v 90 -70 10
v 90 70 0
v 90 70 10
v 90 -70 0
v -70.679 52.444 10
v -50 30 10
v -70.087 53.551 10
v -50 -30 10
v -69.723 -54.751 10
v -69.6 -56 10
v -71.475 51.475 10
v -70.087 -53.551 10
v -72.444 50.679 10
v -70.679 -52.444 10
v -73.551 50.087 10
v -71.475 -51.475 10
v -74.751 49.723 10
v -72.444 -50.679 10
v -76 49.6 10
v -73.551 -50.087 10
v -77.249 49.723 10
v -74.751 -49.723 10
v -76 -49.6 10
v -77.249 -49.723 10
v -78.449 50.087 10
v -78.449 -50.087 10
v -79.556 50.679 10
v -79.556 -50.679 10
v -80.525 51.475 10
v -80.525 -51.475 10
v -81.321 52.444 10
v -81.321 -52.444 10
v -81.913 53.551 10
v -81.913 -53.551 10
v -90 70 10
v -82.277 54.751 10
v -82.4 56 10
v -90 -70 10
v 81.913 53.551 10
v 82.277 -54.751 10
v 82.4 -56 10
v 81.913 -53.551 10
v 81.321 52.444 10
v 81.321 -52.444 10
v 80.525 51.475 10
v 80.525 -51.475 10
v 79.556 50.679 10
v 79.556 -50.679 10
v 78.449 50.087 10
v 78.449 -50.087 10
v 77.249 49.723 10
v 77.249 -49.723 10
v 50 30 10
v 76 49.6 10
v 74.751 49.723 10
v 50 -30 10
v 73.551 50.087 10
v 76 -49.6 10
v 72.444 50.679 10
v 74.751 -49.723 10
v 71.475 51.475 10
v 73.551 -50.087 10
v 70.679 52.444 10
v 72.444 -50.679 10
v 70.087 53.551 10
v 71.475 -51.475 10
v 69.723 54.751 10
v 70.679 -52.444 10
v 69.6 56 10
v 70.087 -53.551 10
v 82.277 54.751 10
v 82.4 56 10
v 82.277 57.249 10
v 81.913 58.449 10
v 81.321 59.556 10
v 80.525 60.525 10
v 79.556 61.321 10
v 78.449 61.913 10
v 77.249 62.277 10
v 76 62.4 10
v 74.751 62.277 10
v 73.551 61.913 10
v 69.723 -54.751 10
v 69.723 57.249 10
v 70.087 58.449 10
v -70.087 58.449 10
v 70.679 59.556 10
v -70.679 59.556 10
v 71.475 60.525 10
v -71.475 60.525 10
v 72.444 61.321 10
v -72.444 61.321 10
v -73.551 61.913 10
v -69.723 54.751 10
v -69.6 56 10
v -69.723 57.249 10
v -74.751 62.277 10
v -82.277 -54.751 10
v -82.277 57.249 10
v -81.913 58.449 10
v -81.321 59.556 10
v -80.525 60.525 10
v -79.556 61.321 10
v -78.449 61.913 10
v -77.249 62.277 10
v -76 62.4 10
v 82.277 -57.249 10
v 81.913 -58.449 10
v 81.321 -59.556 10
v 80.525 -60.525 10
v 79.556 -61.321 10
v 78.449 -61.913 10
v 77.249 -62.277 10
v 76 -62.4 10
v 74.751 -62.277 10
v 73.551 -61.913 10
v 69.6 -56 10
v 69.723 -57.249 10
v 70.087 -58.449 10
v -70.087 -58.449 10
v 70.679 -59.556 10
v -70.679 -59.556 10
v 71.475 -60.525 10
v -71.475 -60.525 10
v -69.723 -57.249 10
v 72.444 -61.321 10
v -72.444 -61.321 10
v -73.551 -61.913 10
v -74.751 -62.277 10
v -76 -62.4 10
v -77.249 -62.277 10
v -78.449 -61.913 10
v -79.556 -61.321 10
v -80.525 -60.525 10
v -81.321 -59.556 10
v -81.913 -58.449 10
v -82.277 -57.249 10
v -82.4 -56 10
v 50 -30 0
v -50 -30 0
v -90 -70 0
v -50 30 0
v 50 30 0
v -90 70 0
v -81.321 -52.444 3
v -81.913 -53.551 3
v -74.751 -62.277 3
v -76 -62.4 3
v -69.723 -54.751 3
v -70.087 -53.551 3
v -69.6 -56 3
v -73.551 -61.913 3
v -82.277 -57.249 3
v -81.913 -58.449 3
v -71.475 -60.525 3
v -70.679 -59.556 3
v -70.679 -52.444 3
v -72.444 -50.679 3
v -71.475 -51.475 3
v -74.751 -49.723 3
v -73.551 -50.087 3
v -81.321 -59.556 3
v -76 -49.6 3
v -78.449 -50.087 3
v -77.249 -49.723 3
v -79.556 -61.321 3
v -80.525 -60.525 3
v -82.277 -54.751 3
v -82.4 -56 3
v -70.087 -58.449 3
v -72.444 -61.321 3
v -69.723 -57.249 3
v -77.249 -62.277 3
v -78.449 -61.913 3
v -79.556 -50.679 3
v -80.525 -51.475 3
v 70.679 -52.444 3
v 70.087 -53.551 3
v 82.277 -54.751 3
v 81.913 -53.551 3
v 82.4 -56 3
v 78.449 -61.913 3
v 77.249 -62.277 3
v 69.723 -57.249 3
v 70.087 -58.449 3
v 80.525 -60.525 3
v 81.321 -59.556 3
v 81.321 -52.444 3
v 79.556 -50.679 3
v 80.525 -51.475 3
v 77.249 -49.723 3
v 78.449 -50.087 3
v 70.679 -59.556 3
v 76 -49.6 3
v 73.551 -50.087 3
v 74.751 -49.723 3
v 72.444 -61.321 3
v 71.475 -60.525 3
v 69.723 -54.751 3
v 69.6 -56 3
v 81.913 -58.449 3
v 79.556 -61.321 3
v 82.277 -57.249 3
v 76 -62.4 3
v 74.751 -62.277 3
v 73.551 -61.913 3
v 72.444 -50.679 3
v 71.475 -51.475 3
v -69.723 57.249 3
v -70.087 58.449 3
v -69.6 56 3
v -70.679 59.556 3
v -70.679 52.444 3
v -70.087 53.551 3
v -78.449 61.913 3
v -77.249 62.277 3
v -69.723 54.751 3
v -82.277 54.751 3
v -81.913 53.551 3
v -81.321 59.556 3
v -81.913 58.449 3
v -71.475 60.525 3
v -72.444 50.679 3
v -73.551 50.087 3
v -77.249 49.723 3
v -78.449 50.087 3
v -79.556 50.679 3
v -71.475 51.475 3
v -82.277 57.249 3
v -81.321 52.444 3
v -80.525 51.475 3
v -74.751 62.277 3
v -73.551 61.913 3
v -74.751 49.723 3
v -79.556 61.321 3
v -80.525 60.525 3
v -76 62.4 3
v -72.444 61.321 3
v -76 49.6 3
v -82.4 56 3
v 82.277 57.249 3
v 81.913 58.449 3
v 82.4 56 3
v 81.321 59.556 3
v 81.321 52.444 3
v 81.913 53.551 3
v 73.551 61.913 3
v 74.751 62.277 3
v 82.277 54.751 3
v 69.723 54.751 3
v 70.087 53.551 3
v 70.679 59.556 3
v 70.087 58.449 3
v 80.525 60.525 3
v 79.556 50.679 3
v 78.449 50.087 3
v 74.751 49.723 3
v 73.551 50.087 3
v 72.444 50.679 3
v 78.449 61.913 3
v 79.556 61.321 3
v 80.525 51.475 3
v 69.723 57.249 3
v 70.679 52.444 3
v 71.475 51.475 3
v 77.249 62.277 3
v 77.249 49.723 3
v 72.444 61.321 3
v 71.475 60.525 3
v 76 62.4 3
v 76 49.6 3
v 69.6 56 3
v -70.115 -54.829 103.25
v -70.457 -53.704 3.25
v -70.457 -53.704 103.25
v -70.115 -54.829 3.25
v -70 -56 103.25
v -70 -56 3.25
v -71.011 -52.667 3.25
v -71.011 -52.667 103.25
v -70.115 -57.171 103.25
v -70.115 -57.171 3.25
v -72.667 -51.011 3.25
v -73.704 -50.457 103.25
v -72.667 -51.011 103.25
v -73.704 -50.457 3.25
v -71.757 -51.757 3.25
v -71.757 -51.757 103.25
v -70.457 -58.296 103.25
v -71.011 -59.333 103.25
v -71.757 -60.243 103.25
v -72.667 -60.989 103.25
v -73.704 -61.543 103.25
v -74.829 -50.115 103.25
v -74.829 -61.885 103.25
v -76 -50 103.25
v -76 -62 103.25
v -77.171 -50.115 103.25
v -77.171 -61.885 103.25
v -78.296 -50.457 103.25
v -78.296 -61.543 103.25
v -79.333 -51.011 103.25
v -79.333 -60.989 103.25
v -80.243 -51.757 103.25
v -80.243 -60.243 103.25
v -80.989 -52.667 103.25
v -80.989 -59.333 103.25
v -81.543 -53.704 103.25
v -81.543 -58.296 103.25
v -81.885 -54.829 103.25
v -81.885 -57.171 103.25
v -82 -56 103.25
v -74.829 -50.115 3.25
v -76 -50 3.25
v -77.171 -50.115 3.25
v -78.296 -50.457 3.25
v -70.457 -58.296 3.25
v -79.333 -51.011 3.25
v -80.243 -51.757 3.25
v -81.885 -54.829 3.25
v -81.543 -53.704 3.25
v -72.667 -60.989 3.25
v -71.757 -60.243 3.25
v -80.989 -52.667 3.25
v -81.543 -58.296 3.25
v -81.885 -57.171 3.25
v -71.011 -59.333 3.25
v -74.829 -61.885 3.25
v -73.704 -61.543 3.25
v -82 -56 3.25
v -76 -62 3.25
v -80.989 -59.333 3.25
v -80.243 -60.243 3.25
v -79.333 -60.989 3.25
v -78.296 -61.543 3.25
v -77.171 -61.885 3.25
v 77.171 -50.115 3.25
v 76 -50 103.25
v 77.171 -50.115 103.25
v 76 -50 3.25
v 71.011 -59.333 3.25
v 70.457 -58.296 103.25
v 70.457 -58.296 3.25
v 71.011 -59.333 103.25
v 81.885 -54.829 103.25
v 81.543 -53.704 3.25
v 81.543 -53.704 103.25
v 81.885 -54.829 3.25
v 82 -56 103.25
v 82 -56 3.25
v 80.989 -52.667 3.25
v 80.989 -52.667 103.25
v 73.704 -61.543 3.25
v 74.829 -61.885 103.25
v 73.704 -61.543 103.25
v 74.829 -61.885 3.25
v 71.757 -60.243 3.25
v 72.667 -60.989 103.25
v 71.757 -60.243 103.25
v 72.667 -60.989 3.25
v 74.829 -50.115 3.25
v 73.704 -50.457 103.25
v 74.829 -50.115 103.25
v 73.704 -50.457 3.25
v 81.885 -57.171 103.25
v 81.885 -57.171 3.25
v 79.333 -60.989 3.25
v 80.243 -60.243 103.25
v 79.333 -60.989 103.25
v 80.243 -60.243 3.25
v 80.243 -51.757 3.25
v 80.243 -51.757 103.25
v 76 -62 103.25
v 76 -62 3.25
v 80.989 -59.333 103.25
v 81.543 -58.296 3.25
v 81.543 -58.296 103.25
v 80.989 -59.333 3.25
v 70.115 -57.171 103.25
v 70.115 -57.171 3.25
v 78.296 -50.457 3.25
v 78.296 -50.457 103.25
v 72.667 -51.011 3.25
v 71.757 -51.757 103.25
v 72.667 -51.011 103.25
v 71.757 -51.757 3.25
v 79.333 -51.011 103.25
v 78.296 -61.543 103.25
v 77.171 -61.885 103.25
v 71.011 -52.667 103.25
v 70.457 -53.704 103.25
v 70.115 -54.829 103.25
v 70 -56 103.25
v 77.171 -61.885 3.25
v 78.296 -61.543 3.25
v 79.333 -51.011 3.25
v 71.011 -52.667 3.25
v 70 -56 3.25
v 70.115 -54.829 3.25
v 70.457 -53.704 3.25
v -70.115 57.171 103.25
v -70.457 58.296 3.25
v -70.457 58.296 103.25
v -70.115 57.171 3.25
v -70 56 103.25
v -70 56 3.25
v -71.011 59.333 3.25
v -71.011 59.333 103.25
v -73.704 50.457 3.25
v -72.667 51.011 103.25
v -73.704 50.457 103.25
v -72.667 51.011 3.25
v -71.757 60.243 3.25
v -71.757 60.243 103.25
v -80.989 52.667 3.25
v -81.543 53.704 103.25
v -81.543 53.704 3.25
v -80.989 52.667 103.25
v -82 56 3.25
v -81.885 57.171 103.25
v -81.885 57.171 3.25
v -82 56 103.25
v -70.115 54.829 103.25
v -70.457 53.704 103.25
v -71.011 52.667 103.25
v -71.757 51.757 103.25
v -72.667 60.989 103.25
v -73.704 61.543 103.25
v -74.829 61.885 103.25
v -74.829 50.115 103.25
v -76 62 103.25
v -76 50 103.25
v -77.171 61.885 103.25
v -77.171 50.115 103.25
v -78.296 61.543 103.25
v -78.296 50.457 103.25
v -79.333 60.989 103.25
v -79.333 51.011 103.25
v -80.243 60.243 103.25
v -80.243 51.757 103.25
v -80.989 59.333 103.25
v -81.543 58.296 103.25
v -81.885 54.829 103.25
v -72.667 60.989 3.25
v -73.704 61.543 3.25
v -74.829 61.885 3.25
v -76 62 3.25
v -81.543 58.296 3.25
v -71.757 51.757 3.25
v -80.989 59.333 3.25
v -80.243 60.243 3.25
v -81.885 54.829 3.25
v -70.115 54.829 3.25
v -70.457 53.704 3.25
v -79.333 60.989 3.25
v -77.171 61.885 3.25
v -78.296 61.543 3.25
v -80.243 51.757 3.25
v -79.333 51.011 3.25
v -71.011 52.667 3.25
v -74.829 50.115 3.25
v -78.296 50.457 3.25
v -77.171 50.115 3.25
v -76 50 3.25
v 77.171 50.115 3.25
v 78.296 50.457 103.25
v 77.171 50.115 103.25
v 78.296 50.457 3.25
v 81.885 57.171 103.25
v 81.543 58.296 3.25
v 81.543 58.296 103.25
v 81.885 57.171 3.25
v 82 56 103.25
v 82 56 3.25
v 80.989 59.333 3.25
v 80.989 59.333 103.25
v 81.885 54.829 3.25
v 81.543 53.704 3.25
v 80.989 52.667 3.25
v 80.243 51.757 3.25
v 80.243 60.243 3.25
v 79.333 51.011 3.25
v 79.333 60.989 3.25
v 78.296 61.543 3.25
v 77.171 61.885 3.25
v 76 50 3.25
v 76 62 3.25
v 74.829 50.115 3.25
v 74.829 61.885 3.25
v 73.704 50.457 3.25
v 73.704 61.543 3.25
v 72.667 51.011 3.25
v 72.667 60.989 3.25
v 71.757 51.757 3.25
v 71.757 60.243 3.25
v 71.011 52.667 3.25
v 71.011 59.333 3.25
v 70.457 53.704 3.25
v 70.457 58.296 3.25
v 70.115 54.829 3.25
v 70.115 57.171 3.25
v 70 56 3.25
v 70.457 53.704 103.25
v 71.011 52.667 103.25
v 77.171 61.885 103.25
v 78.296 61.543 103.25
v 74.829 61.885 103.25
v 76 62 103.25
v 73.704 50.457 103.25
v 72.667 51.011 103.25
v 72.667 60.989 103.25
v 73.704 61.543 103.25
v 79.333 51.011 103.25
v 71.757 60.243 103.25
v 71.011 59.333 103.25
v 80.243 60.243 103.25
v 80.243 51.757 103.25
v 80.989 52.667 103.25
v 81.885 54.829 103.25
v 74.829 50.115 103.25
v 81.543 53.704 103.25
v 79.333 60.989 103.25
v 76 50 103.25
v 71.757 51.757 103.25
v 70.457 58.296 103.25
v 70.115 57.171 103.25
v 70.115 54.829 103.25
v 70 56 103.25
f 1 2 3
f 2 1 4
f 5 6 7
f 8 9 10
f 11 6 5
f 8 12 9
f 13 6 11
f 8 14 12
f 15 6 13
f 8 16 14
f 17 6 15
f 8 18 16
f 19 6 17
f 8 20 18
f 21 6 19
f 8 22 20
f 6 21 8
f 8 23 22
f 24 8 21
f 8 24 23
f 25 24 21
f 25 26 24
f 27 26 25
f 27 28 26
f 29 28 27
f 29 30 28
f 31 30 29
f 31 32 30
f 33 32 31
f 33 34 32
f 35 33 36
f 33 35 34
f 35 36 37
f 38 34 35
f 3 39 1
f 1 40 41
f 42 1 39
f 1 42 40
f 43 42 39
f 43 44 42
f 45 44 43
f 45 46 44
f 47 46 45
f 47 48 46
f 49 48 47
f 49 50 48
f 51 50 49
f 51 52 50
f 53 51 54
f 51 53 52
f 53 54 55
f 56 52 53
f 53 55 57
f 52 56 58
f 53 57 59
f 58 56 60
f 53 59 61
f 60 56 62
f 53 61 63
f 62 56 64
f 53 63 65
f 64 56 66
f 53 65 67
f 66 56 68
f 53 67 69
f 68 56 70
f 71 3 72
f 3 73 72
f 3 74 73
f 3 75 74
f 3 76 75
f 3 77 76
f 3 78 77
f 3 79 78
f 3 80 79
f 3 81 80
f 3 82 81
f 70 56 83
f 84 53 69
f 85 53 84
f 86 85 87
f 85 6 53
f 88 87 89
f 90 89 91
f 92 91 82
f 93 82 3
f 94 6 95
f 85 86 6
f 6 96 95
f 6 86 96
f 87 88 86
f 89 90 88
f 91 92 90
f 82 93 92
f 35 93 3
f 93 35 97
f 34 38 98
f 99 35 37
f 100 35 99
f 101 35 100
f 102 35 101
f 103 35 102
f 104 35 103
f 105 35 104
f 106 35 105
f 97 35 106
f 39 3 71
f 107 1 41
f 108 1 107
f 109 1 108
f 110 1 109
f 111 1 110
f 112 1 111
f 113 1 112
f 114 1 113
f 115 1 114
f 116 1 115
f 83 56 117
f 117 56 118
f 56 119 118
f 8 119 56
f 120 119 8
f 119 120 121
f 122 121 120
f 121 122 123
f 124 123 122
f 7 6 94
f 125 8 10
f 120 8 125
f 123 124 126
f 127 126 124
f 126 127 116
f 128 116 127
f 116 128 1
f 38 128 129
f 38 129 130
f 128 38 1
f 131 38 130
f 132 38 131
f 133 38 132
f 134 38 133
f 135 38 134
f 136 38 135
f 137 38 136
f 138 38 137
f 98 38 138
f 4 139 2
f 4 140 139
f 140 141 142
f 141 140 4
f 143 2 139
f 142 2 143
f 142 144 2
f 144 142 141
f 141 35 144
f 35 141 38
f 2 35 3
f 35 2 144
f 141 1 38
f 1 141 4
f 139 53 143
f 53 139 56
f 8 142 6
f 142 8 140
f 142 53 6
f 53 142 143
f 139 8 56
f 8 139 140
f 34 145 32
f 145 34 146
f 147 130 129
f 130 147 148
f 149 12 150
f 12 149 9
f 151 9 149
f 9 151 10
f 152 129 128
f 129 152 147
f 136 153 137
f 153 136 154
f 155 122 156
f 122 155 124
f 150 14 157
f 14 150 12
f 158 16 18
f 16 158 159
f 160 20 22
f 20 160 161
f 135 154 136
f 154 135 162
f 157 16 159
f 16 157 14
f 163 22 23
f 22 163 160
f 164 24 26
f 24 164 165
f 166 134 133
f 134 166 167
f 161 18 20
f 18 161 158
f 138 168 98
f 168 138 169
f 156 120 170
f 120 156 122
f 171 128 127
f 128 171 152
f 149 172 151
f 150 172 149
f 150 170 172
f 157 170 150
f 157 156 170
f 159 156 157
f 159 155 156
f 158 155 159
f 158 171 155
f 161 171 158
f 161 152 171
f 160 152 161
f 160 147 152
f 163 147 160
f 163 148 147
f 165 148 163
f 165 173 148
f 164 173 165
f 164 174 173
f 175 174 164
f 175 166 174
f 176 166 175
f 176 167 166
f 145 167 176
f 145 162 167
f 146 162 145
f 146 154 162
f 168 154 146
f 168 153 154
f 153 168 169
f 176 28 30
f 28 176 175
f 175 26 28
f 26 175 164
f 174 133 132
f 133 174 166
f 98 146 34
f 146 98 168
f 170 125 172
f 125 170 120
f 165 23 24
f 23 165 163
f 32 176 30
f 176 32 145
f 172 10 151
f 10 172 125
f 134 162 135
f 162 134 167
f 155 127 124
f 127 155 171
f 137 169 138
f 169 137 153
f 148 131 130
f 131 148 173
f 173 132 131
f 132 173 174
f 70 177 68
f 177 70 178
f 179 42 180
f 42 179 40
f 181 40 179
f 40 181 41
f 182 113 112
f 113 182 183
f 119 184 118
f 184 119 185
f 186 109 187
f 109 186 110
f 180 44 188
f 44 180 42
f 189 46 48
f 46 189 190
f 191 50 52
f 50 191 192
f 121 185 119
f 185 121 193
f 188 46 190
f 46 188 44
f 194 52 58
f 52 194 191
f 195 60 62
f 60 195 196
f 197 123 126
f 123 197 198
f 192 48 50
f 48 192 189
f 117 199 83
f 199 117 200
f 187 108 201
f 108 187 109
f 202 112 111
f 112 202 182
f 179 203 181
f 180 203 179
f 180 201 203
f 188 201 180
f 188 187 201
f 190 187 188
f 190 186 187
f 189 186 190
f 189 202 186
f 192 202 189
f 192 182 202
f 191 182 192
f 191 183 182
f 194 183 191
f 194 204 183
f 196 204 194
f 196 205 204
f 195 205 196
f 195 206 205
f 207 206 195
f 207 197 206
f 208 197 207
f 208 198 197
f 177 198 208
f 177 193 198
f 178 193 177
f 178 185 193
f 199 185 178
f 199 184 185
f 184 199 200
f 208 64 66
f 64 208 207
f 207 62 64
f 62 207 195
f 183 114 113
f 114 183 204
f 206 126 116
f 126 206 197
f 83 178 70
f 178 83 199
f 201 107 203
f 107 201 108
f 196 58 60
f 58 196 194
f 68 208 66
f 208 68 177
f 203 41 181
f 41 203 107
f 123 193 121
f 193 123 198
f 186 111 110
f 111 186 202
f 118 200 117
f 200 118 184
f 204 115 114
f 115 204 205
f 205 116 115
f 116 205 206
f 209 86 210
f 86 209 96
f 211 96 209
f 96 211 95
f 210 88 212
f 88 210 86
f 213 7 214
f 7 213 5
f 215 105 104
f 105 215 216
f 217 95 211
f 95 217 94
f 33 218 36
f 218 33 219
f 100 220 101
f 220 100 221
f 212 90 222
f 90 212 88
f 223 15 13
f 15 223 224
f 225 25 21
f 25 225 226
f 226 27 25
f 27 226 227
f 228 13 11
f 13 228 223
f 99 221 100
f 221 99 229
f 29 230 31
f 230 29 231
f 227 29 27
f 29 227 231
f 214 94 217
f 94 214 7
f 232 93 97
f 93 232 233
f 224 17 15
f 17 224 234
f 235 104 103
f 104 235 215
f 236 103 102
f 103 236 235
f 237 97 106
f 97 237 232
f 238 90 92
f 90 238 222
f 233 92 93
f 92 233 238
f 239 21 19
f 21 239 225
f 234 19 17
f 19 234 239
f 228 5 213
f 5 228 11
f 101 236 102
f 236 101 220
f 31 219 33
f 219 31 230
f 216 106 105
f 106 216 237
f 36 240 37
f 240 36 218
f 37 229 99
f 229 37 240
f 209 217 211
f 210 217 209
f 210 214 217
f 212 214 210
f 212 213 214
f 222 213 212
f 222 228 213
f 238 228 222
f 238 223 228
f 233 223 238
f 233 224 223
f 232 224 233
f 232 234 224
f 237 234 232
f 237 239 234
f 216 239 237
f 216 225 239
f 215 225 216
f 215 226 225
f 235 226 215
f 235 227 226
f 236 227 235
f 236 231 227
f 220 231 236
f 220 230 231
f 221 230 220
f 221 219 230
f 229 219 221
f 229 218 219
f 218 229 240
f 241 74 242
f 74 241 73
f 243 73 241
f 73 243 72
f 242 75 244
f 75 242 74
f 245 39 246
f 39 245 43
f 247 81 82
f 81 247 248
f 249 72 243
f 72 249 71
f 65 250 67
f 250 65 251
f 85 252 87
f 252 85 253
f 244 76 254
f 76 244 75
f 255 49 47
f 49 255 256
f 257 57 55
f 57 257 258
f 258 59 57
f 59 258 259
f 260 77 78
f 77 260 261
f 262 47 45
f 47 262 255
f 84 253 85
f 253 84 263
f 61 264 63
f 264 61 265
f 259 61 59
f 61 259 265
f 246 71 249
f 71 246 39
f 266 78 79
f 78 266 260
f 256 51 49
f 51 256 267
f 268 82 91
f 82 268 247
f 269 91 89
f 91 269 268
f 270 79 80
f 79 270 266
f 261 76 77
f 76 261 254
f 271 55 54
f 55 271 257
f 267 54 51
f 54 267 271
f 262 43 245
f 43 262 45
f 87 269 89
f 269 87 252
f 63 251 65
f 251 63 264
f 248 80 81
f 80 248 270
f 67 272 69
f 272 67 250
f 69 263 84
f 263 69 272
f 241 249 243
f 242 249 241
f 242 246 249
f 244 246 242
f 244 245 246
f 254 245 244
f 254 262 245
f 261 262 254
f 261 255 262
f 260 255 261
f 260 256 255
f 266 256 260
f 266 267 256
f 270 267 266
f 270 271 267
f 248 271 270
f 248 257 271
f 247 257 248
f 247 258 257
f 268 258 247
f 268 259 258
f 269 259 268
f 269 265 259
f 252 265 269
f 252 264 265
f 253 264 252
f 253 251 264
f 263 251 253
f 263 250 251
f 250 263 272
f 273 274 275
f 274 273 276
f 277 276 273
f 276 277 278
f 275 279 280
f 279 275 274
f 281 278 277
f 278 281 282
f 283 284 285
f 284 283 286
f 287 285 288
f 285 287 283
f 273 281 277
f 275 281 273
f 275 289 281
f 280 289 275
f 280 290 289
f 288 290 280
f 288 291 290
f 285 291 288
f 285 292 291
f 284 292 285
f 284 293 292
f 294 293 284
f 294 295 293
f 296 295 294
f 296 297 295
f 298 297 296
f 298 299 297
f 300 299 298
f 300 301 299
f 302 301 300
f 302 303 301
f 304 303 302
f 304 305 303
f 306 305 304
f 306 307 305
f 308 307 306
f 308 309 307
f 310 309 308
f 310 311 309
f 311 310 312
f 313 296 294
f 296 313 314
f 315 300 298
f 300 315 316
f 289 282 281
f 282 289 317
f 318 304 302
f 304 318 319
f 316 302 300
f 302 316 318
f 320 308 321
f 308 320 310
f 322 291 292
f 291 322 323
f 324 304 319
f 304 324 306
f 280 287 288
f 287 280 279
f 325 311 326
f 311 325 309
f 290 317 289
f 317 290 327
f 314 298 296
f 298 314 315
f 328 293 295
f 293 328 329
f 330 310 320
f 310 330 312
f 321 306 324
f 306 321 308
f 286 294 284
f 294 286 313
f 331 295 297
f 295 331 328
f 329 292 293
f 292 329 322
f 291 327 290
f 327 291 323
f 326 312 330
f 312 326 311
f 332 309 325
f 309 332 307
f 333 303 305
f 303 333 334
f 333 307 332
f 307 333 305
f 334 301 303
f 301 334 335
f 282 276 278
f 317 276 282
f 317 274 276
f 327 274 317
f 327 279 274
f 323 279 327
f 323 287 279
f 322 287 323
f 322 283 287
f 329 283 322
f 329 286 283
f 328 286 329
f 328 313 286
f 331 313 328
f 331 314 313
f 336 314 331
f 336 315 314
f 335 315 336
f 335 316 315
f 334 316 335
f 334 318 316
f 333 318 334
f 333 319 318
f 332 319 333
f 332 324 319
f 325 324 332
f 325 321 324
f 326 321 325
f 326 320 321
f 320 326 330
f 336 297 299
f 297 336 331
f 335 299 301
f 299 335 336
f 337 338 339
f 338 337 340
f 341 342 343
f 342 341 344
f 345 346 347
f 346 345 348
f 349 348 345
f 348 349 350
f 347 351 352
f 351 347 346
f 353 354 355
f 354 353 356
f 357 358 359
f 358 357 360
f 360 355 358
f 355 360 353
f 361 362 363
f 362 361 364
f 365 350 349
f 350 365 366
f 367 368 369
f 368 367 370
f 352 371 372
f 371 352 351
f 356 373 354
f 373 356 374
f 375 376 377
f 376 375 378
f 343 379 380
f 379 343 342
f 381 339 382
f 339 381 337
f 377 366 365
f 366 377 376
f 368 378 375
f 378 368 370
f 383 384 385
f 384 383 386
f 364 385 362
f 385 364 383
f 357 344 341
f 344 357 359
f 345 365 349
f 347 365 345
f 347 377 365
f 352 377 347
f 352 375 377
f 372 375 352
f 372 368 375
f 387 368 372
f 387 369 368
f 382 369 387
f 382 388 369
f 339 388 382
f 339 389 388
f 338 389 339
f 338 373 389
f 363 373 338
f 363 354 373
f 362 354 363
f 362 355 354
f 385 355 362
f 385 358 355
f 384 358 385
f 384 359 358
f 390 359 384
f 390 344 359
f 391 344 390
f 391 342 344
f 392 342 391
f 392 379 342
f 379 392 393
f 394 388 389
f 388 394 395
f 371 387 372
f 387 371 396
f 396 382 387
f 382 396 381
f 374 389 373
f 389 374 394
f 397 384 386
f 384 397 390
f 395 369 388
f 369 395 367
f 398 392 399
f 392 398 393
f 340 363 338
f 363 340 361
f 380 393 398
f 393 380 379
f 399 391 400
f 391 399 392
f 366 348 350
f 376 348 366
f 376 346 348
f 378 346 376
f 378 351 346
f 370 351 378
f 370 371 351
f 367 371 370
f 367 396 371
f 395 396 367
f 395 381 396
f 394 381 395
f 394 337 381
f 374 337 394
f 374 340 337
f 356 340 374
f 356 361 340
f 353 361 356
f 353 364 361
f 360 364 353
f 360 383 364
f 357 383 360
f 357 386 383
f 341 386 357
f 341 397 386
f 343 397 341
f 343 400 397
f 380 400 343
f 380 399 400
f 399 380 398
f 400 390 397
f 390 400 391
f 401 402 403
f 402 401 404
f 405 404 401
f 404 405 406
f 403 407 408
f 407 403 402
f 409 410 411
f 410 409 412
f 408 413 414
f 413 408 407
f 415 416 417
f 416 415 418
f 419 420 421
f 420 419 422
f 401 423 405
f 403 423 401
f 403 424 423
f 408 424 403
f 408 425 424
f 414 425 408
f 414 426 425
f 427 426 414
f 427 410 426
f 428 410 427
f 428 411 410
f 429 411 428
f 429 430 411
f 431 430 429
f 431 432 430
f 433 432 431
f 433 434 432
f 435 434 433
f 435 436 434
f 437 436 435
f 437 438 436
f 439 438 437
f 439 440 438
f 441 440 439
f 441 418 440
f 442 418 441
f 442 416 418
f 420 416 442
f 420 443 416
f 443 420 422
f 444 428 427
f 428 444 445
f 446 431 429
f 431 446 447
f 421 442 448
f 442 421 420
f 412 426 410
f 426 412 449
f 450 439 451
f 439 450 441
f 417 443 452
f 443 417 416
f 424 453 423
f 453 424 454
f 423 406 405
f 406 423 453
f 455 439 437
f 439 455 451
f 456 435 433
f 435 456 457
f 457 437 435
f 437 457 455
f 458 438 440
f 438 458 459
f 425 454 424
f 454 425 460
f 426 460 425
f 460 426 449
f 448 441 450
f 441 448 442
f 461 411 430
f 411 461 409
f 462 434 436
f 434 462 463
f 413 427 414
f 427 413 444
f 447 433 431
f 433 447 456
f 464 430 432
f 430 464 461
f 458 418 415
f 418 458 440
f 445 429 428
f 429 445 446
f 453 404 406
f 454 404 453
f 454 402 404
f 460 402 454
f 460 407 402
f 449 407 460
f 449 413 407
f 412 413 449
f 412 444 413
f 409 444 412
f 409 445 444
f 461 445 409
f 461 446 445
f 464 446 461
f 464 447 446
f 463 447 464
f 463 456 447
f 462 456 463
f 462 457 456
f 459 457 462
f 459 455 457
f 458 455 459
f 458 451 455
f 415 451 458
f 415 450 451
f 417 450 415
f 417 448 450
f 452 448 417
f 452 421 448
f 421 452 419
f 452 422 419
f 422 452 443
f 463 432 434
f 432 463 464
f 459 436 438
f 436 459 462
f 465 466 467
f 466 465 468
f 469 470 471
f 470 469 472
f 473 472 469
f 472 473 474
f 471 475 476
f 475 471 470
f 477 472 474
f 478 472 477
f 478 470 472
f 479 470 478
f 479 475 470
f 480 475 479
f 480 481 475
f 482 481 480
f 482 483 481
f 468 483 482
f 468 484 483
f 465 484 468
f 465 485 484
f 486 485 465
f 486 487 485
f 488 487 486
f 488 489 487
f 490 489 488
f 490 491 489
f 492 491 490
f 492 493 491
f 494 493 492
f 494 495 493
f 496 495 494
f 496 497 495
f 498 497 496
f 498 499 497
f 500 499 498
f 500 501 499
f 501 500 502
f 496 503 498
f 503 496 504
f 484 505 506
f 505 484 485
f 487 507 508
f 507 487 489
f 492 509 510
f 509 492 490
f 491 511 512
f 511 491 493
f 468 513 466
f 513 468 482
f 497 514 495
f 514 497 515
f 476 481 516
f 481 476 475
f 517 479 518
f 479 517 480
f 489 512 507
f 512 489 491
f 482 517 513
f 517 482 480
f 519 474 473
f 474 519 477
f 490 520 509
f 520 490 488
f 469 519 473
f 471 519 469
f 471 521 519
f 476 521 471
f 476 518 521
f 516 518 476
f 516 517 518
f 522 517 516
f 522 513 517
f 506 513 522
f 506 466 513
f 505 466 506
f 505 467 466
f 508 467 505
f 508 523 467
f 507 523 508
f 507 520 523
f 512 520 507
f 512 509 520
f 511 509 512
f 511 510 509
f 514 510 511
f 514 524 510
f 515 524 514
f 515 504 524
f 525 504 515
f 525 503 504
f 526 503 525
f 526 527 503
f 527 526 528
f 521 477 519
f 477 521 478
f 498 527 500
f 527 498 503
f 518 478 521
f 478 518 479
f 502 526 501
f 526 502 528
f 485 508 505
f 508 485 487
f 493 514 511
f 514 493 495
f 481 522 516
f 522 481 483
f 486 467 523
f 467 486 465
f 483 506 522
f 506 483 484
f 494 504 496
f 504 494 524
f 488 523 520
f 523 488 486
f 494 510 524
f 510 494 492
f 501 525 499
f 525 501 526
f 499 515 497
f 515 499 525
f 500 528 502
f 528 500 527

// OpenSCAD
$fn = 32;

// ------------------------------------------------------------------------
// Frame with four posts: 180 x 140 mm frame, four d12 posts
// Every part is its own module, assembly() places them once.
// ------------------------------------------------------------------------

// --- part 1 ---
module base_frame() {
  difference() {
    translate([-90, -70, 0]) cube([180, 140, 10]);
    translate([-50, -30, -1]) cube([100, 60, 12]);
    translate([-76, -56, 3]) cylinder(h = 8, d = 12.8);
    translate([76, -56, 3]) cylinder(h = 8, d = 12.8);
    translate([-76, 56, 3]) cylinder(h = 8, d = 12.8);
    translate([76, 56, 3]) cylinder(h = 8, d = 12.8);
  }
}

// --- part 2 ---
module post1() {
  cylinder(h = 100, d = 12);
}

// --- part 3 ---
module post2() {
  cylinder(h = 100, d = 12);
}

// --- part 4 ---
module post3() {
  cylinder(h = 100, d = 12);
}

// --- part 5 ---
module post4() {
  cylinder(h = 100, d = 12);
}

// --- assembly ---
module assembly() {
  translate([0, 0, 0]) rotate([0, 0, 0]) base_frame();
  translate([-76, -56, 3.25]) rotate([0, 0, 0]) post1();
  translate([76, -56, 3.25]) rotate([0, 0, 0]) post2();
  translate([-76, 56, 3.25]) rotate([0, 0, 0]) post3();
  translate([76, 56, 3.25]) rotate([0, 0, 0]) post4();
}

assembly();
